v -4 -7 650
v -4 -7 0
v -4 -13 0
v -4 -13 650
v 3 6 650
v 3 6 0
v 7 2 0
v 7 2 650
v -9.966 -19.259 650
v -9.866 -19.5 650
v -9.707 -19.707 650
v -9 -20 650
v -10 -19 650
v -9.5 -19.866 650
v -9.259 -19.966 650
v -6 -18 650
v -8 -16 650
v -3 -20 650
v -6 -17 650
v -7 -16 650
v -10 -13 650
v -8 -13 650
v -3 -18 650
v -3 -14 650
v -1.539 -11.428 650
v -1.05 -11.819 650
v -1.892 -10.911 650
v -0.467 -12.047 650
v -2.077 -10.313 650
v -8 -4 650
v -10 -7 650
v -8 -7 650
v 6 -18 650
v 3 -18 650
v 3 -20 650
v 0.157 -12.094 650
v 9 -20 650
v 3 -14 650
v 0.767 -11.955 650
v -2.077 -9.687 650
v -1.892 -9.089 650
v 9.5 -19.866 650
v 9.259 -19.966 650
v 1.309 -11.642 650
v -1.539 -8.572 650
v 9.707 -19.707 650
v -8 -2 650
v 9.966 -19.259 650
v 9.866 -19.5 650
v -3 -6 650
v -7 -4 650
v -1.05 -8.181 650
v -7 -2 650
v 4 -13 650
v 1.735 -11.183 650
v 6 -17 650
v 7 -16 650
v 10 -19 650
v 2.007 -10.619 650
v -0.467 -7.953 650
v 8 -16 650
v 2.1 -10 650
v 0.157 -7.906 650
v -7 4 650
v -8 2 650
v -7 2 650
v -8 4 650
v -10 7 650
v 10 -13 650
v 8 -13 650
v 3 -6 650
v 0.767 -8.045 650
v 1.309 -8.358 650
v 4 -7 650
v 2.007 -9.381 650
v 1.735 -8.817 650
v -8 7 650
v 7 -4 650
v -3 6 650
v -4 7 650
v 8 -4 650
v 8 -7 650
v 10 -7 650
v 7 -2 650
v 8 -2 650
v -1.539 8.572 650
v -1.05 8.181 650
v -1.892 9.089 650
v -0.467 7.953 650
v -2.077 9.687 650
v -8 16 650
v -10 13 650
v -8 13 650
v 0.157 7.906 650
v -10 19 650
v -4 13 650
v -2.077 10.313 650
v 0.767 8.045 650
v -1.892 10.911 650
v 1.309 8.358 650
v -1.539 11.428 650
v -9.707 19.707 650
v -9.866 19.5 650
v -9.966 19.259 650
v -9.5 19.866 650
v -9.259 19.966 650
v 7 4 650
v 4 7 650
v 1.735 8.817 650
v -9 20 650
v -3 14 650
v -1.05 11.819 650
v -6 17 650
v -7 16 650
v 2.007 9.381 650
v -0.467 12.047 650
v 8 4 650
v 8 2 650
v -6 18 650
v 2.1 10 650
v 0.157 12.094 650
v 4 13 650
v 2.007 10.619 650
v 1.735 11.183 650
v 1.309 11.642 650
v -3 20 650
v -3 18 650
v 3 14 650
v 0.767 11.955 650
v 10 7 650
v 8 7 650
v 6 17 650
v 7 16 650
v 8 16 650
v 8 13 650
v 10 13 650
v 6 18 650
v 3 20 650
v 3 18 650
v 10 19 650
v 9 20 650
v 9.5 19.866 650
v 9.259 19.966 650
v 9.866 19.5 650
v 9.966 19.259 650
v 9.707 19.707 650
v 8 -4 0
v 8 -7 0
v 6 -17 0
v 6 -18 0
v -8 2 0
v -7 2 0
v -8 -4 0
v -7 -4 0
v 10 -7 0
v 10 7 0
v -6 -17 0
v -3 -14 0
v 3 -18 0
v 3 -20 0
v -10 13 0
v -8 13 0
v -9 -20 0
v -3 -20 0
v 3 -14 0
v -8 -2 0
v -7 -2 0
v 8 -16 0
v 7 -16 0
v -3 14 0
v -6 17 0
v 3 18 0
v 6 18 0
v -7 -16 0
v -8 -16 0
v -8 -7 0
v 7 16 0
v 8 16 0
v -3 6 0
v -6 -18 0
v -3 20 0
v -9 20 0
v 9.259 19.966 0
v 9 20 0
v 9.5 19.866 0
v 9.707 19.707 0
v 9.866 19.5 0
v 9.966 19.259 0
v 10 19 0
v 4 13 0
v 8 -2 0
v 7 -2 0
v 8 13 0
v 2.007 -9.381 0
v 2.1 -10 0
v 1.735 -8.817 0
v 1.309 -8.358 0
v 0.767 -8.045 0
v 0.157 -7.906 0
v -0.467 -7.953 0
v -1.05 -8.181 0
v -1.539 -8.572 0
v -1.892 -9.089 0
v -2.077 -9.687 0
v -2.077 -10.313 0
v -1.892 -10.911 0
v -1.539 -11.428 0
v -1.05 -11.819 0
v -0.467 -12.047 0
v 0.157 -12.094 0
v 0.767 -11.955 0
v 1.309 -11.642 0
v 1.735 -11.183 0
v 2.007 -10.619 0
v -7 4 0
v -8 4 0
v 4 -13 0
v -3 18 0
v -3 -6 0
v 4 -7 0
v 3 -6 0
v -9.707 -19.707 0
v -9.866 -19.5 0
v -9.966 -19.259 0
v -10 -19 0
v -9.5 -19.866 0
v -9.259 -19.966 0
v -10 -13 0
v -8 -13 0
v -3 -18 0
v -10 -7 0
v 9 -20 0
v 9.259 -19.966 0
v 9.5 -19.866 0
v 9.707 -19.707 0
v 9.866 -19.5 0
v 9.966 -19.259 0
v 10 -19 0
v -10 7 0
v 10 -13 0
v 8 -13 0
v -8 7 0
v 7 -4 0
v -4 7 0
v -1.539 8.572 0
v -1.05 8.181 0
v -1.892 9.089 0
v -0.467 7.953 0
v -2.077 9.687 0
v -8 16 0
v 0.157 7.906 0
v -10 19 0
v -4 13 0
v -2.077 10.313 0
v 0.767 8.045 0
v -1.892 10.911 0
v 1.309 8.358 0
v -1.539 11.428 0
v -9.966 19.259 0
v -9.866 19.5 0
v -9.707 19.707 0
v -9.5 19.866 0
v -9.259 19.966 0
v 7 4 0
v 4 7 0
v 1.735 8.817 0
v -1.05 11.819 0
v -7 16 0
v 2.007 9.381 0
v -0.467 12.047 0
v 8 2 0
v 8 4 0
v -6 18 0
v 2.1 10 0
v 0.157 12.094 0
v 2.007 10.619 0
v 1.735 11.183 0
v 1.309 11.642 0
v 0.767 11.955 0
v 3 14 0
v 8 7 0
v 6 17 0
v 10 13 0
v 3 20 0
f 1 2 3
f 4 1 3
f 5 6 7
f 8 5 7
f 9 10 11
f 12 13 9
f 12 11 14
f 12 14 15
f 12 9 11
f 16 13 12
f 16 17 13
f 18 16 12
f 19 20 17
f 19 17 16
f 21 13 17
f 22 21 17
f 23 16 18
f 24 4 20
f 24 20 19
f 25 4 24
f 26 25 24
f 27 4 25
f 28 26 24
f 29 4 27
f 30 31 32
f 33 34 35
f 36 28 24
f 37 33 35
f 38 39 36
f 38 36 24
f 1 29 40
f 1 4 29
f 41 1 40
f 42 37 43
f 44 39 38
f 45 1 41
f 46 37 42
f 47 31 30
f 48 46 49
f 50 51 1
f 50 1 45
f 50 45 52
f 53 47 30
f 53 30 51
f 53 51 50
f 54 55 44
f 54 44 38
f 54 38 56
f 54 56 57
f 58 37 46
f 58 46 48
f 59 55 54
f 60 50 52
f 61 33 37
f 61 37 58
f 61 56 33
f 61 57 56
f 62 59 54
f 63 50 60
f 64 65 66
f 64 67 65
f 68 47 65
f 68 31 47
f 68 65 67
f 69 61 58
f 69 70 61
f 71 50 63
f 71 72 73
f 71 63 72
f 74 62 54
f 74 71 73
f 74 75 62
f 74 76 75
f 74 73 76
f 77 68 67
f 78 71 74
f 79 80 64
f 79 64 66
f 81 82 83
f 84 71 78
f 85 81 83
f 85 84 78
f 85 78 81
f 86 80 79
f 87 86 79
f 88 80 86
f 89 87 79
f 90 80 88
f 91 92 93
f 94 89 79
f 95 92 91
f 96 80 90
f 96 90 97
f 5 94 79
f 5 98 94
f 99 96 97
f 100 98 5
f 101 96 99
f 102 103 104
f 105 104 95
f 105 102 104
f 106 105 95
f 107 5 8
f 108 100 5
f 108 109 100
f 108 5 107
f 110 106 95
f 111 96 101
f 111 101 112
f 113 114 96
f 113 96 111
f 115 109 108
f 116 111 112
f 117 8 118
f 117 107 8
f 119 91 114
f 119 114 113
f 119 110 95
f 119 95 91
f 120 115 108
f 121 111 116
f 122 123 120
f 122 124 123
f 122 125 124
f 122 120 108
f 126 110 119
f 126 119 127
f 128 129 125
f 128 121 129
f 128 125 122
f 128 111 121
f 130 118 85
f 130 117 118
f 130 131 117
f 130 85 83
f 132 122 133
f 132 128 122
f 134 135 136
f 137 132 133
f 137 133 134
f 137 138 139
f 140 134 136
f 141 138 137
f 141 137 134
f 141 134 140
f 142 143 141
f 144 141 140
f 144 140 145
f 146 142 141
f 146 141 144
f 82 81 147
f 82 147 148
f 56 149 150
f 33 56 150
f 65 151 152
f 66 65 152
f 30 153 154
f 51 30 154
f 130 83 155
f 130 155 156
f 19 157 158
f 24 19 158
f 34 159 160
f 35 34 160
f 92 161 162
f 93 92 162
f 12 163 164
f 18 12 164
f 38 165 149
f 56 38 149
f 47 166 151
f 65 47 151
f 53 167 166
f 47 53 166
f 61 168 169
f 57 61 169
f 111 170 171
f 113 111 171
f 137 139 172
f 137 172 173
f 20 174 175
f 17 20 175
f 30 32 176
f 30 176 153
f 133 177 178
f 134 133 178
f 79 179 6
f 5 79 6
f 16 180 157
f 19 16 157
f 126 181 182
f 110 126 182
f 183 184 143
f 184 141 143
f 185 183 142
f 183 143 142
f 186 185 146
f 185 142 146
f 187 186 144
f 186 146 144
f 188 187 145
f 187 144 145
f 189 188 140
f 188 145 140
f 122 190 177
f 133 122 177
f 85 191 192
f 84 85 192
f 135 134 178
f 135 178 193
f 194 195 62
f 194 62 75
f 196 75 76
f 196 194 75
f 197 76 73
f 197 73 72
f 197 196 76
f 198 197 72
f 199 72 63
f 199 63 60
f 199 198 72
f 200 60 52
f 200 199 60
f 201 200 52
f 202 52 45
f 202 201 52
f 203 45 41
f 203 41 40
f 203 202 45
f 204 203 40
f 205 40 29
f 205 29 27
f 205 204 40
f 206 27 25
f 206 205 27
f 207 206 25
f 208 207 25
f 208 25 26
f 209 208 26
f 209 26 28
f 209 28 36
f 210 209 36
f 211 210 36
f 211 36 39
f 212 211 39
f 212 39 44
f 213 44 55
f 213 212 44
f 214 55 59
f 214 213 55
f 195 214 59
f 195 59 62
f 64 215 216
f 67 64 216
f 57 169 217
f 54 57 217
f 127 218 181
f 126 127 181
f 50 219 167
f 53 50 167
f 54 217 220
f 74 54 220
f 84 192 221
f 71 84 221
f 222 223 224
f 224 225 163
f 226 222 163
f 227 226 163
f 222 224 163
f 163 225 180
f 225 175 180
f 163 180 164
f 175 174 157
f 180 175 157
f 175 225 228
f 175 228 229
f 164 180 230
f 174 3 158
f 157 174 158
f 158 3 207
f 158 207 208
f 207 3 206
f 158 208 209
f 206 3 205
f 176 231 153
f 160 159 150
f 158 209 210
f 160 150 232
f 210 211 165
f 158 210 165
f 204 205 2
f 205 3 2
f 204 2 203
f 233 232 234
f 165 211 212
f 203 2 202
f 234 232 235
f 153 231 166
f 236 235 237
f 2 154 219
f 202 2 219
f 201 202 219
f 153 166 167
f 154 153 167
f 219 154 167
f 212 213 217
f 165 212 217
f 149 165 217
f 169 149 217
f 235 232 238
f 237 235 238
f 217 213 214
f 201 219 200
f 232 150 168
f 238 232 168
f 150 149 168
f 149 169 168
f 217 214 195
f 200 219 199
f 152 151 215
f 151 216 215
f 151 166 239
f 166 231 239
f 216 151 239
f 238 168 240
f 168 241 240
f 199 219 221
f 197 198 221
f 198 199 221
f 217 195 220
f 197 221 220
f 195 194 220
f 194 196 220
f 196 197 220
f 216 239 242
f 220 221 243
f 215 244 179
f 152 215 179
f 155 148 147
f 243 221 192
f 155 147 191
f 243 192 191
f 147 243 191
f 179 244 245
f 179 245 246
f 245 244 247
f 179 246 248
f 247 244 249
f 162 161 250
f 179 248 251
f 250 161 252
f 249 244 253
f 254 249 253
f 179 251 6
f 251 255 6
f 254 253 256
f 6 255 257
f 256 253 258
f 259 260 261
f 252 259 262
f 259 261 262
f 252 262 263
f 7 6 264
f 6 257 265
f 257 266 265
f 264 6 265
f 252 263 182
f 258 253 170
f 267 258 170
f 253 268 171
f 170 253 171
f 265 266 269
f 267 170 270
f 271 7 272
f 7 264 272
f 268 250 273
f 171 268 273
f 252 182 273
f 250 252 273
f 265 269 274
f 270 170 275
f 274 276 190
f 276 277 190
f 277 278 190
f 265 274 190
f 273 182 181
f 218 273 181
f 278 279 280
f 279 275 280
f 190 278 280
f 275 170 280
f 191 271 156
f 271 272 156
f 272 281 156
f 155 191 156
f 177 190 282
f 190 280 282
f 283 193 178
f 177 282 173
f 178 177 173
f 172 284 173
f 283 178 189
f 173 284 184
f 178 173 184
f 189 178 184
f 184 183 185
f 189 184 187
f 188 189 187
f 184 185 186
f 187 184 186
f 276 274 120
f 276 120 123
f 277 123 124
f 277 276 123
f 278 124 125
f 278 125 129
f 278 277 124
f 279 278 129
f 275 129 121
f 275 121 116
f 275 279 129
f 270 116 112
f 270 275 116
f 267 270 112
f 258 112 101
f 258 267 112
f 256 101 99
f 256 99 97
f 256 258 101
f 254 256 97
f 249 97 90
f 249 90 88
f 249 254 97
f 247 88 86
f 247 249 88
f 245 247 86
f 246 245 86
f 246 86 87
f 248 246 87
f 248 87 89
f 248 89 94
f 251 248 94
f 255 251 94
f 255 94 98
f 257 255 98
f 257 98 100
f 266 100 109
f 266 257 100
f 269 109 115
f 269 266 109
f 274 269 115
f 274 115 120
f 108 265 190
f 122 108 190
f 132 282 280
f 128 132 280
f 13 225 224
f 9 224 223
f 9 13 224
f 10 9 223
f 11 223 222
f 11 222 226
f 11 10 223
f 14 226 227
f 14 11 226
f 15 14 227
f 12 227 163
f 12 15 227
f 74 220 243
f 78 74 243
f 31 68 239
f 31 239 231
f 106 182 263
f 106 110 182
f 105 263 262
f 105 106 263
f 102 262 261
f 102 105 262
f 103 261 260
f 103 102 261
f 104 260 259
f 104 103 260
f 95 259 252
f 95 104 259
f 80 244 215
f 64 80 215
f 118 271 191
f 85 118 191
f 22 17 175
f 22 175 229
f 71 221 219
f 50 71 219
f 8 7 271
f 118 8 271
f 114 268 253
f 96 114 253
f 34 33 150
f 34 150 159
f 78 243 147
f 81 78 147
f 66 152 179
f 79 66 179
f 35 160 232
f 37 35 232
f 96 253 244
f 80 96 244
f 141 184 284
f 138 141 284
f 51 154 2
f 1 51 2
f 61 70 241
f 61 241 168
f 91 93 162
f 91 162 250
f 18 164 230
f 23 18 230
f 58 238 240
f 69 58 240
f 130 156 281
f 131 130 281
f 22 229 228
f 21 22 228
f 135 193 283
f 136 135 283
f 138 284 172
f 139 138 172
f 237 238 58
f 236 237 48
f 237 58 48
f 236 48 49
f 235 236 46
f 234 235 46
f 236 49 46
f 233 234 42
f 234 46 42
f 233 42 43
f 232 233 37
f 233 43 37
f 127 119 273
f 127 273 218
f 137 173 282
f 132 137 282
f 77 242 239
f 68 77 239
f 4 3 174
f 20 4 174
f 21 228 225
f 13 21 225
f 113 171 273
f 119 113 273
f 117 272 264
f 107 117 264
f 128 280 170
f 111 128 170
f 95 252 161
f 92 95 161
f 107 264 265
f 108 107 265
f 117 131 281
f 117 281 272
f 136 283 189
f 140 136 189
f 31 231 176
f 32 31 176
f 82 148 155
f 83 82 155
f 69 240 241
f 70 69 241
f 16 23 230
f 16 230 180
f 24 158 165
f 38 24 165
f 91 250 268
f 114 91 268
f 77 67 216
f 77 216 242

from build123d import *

# Parameters (mm, degrees)
SCHIZZO1_R                   = 2.1
ESTRUSIONE_ESTRUSIONE1_DEPTH = 650
RACCORDO1_R                  = 1


with BuildPart() as part:
    # Schizzo1 → Estrusione-Estrusione1 (new body)
    with BuildSketch(Plane.XY):
        Polygon((-3, 20), (-10, 20), (-10, 13), (-8, 13), (-8, 16), (-7, 16), (-4, 13), (-4, 7), (-7, 4), (-8, 4), (-8, 7), (-10, 7), (-10, -7), (-8, -7), (-8, -4), (-7, -4), (-4, -7), (-4, -13), (-7, -16), (-8, -16), (-8, -13), (-10, -13), (-10, -20), (-3, -20), (-3, -18), (-6, -18), (-6, -17), (-3, -14), (3, -14), (6, -17), (6, -18), (3, -18), (3, -20), (10, -20), (10, -13), (8, -13), (8, -16), (7, -16), (4, -13), (4, -7), (7, -4), (8, -4), (8, -7), (10, -7), (10, 7), (8, 7), (8, 4), (7, 4), (4, 7), (4, 13), (7, 16), (8, 16), (8, 13), (10, 13), (10, 20), (3, 20), (3, 18), (6, 18), (6, 17), (3, 14), (-3, 14), (-6, 17), (-6, 18), (-3, 18), align=None)
        Polygon((8, 2), (8, -2), (7, -2), (3, -6), (-3, -6), (-7, -2), (-8, -2), (-8, 2), (-7, 2), (-3, 6), (3, 6), (7, 2), align=None, mode=Mode.SUBTRACT)
        with Locations((0, 10)):
            Circle(SCHIZZO1_R, mode=Mode.SUBTRACT)
        with Locations((0, -10)):
            Circle(SCHIZZO1_R, mode=Mode.SUBTRACT)
    extrude(amount=ESTRUSIONE_ESTRUSIONE1_DEPTH)

    # Raccordo1
    raccordo1_edges = [part.edges().sort_by_distance(p)[0] for p in [
        (-10, 20, 325),
        (10, 20, 325),
        (10, -20, 325),
        (-10, -20, 325),
    ]]
    fillet(raccordo1_edges, radius=RACCORDO1_R)


solid = part.part
